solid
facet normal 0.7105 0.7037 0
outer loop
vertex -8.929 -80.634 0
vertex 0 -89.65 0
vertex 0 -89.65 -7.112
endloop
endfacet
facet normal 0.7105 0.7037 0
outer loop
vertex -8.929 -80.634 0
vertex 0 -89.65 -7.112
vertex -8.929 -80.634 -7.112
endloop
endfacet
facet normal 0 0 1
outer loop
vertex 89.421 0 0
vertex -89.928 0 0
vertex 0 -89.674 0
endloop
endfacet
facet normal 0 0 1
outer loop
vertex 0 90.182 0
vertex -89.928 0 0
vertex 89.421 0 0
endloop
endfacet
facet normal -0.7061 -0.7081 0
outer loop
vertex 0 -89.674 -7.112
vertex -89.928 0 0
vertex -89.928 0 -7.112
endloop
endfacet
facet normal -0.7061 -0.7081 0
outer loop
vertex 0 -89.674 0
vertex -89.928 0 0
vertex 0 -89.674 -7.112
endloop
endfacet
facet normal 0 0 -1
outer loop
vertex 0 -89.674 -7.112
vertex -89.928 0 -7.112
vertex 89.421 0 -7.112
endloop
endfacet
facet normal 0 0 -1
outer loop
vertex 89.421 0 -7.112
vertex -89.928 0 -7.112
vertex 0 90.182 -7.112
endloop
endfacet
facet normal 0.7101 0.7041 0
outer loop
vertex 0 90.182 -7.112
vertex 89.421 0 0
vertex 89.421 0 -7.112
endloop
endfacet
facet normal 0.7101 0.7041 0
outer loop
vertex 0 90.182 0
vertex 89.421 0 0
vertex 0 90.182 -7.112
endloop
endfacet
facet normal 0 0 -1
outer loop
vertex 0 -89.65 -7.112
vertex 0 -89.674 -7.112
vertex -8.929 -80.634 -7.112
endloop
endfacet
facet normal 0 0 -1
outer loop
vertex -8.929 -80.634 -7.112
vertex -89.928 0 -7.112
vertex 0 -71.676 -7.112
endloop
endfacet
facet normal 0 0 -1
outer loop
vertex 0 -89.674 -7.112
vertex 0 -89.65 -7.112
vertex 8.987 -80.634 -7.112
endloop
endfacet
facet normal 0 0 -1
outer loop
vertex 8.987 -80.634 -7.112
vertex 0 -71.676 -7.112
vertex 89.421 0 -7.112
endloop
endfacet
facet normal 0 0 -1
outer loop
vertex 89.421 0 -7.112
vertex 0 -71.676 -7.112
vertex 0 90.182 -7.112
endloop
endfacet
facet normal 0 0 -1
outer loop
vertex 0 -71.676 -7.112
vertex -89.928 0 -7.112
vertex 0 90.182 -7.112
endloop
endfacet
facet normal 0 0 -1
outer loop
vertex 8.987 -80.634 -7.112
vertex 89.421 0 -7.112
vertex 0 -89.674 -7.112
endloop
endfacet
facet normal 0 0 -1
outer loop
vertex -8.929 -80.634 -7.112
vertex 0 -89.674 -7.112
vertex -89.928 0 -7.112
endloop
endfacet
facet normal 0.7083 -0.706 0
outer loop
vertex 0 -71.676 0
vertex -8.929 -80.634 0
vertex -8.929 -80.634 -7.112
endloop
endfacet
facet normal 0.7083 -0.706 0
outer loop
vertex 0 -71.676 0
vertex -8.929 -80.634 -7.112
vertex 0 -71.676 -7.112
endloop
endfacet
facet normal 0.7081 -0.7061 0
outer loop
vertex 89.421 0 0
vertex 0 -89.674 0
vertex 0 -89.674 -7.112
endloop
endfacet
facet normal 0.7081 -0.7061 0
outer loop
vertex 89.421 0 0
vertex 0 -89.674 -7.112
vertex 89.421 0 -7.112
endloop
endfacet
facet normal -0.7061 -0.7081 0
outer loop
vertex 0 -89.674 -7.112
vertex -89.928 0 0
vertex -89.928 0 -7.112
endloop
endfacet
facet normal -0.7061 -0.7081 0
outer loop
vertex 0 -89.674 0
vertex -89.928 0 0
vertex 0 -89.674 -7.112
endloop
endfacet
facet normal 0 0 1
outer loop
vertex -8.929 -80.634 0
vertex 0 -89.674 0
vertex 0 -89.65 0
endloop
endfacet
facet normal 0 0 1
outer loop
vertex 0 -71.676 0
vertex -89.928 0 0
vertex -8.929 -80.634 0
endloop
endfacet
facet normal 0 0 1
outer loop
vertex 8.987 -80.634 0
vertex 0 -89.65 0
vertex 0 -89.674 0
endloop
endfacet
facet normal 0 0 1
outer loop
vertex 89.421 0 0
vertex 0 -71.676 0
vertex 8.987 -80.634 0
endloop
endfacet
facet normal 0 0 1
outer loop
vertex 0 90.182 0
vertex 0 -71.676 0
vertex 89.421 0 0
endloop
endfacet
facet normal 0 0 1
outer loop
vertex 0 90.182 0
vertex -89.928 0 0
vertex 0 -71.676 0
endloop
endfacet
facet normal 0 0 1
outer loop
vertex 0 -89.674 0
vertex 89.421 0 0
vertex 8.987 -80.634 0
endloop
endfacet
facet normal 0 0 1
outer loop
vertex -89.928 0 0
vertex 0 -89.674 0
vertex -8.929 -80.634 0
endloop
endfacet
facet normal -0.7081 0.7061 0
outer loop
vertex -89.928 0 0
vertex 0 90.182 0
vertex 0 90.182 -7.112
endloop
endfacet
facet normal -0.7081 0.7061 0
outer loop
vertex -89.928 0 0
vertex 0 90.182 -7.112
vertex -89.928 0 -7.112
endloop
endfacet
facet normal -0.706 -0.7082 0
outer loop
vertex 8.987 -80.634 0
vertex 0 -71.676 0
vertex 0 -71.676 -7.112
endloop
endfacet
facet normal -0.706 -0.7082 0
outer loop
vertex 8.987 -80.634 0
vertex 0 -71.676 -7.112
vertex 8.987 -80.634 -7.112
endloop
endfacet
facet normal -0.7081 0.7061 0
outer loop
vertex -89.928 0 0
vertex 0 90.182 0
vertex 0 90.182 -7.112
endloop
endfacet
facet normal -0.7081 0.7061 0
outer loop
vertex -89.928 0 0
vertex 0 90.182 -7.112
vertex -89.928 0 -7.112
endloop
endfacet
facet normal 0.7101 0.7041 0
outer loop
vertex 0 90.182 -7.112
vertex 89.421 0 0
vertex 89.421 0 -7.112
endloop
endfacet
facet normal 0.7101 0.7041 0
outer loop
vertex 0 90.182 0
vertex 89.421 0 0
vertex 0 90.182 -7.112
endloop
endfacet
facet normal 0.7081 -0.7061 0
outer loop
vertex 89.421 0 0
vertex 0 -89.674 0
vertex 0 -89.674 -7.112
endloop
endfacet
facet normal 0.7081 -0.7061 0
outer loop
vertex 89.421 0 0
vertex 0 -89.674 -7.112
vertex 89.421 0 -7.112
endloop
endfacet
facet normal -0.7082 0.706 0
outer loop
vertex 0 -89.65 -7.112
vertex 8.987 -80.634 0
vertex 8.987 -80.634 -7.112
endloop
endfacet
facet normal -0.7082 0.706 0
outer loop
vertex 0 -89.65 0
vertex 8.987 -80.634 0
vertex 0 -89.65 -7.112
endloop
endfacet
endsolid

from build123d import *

# Parameters (mm, degrees)
F4_DEPTH = 7.112


# Not quite as in the source:
# - the program builds the solid bodies; features that only make, move or delete a surface that nothing else refers to are left out


with BuildPart() as f4:
    # F2 (on face) → F4 (new body)
    with BuildSketch(Plane.XY):
        Polygon((0, -89.6742220027), (89.421303474, 0), (0, 90.1822071421), (-89.9278558843, 0), align=None)
        Polygon((8.9867543429, -80.634124577), (0, -89.6500274539), (-8.9287396832, -80.634124577), (0, -71.6764245305), align=None, mode=Mode.SUBTRACT)
    extrude(amount=-F4_DEPTH)


with BuildPart() as f4b:
    # F0 (on Top) → F4, piece 2 (new body)
    with BuildSketch(Plane.XY):
        Polygon((89.421303474, 0), (0, 90.1822071421), (-89.9278558843, 0), (0, -89.6742220027), align=None)
    extrude(amount=-F4_DEPTH)


solid = Compound([f4.part, f4b.part])
